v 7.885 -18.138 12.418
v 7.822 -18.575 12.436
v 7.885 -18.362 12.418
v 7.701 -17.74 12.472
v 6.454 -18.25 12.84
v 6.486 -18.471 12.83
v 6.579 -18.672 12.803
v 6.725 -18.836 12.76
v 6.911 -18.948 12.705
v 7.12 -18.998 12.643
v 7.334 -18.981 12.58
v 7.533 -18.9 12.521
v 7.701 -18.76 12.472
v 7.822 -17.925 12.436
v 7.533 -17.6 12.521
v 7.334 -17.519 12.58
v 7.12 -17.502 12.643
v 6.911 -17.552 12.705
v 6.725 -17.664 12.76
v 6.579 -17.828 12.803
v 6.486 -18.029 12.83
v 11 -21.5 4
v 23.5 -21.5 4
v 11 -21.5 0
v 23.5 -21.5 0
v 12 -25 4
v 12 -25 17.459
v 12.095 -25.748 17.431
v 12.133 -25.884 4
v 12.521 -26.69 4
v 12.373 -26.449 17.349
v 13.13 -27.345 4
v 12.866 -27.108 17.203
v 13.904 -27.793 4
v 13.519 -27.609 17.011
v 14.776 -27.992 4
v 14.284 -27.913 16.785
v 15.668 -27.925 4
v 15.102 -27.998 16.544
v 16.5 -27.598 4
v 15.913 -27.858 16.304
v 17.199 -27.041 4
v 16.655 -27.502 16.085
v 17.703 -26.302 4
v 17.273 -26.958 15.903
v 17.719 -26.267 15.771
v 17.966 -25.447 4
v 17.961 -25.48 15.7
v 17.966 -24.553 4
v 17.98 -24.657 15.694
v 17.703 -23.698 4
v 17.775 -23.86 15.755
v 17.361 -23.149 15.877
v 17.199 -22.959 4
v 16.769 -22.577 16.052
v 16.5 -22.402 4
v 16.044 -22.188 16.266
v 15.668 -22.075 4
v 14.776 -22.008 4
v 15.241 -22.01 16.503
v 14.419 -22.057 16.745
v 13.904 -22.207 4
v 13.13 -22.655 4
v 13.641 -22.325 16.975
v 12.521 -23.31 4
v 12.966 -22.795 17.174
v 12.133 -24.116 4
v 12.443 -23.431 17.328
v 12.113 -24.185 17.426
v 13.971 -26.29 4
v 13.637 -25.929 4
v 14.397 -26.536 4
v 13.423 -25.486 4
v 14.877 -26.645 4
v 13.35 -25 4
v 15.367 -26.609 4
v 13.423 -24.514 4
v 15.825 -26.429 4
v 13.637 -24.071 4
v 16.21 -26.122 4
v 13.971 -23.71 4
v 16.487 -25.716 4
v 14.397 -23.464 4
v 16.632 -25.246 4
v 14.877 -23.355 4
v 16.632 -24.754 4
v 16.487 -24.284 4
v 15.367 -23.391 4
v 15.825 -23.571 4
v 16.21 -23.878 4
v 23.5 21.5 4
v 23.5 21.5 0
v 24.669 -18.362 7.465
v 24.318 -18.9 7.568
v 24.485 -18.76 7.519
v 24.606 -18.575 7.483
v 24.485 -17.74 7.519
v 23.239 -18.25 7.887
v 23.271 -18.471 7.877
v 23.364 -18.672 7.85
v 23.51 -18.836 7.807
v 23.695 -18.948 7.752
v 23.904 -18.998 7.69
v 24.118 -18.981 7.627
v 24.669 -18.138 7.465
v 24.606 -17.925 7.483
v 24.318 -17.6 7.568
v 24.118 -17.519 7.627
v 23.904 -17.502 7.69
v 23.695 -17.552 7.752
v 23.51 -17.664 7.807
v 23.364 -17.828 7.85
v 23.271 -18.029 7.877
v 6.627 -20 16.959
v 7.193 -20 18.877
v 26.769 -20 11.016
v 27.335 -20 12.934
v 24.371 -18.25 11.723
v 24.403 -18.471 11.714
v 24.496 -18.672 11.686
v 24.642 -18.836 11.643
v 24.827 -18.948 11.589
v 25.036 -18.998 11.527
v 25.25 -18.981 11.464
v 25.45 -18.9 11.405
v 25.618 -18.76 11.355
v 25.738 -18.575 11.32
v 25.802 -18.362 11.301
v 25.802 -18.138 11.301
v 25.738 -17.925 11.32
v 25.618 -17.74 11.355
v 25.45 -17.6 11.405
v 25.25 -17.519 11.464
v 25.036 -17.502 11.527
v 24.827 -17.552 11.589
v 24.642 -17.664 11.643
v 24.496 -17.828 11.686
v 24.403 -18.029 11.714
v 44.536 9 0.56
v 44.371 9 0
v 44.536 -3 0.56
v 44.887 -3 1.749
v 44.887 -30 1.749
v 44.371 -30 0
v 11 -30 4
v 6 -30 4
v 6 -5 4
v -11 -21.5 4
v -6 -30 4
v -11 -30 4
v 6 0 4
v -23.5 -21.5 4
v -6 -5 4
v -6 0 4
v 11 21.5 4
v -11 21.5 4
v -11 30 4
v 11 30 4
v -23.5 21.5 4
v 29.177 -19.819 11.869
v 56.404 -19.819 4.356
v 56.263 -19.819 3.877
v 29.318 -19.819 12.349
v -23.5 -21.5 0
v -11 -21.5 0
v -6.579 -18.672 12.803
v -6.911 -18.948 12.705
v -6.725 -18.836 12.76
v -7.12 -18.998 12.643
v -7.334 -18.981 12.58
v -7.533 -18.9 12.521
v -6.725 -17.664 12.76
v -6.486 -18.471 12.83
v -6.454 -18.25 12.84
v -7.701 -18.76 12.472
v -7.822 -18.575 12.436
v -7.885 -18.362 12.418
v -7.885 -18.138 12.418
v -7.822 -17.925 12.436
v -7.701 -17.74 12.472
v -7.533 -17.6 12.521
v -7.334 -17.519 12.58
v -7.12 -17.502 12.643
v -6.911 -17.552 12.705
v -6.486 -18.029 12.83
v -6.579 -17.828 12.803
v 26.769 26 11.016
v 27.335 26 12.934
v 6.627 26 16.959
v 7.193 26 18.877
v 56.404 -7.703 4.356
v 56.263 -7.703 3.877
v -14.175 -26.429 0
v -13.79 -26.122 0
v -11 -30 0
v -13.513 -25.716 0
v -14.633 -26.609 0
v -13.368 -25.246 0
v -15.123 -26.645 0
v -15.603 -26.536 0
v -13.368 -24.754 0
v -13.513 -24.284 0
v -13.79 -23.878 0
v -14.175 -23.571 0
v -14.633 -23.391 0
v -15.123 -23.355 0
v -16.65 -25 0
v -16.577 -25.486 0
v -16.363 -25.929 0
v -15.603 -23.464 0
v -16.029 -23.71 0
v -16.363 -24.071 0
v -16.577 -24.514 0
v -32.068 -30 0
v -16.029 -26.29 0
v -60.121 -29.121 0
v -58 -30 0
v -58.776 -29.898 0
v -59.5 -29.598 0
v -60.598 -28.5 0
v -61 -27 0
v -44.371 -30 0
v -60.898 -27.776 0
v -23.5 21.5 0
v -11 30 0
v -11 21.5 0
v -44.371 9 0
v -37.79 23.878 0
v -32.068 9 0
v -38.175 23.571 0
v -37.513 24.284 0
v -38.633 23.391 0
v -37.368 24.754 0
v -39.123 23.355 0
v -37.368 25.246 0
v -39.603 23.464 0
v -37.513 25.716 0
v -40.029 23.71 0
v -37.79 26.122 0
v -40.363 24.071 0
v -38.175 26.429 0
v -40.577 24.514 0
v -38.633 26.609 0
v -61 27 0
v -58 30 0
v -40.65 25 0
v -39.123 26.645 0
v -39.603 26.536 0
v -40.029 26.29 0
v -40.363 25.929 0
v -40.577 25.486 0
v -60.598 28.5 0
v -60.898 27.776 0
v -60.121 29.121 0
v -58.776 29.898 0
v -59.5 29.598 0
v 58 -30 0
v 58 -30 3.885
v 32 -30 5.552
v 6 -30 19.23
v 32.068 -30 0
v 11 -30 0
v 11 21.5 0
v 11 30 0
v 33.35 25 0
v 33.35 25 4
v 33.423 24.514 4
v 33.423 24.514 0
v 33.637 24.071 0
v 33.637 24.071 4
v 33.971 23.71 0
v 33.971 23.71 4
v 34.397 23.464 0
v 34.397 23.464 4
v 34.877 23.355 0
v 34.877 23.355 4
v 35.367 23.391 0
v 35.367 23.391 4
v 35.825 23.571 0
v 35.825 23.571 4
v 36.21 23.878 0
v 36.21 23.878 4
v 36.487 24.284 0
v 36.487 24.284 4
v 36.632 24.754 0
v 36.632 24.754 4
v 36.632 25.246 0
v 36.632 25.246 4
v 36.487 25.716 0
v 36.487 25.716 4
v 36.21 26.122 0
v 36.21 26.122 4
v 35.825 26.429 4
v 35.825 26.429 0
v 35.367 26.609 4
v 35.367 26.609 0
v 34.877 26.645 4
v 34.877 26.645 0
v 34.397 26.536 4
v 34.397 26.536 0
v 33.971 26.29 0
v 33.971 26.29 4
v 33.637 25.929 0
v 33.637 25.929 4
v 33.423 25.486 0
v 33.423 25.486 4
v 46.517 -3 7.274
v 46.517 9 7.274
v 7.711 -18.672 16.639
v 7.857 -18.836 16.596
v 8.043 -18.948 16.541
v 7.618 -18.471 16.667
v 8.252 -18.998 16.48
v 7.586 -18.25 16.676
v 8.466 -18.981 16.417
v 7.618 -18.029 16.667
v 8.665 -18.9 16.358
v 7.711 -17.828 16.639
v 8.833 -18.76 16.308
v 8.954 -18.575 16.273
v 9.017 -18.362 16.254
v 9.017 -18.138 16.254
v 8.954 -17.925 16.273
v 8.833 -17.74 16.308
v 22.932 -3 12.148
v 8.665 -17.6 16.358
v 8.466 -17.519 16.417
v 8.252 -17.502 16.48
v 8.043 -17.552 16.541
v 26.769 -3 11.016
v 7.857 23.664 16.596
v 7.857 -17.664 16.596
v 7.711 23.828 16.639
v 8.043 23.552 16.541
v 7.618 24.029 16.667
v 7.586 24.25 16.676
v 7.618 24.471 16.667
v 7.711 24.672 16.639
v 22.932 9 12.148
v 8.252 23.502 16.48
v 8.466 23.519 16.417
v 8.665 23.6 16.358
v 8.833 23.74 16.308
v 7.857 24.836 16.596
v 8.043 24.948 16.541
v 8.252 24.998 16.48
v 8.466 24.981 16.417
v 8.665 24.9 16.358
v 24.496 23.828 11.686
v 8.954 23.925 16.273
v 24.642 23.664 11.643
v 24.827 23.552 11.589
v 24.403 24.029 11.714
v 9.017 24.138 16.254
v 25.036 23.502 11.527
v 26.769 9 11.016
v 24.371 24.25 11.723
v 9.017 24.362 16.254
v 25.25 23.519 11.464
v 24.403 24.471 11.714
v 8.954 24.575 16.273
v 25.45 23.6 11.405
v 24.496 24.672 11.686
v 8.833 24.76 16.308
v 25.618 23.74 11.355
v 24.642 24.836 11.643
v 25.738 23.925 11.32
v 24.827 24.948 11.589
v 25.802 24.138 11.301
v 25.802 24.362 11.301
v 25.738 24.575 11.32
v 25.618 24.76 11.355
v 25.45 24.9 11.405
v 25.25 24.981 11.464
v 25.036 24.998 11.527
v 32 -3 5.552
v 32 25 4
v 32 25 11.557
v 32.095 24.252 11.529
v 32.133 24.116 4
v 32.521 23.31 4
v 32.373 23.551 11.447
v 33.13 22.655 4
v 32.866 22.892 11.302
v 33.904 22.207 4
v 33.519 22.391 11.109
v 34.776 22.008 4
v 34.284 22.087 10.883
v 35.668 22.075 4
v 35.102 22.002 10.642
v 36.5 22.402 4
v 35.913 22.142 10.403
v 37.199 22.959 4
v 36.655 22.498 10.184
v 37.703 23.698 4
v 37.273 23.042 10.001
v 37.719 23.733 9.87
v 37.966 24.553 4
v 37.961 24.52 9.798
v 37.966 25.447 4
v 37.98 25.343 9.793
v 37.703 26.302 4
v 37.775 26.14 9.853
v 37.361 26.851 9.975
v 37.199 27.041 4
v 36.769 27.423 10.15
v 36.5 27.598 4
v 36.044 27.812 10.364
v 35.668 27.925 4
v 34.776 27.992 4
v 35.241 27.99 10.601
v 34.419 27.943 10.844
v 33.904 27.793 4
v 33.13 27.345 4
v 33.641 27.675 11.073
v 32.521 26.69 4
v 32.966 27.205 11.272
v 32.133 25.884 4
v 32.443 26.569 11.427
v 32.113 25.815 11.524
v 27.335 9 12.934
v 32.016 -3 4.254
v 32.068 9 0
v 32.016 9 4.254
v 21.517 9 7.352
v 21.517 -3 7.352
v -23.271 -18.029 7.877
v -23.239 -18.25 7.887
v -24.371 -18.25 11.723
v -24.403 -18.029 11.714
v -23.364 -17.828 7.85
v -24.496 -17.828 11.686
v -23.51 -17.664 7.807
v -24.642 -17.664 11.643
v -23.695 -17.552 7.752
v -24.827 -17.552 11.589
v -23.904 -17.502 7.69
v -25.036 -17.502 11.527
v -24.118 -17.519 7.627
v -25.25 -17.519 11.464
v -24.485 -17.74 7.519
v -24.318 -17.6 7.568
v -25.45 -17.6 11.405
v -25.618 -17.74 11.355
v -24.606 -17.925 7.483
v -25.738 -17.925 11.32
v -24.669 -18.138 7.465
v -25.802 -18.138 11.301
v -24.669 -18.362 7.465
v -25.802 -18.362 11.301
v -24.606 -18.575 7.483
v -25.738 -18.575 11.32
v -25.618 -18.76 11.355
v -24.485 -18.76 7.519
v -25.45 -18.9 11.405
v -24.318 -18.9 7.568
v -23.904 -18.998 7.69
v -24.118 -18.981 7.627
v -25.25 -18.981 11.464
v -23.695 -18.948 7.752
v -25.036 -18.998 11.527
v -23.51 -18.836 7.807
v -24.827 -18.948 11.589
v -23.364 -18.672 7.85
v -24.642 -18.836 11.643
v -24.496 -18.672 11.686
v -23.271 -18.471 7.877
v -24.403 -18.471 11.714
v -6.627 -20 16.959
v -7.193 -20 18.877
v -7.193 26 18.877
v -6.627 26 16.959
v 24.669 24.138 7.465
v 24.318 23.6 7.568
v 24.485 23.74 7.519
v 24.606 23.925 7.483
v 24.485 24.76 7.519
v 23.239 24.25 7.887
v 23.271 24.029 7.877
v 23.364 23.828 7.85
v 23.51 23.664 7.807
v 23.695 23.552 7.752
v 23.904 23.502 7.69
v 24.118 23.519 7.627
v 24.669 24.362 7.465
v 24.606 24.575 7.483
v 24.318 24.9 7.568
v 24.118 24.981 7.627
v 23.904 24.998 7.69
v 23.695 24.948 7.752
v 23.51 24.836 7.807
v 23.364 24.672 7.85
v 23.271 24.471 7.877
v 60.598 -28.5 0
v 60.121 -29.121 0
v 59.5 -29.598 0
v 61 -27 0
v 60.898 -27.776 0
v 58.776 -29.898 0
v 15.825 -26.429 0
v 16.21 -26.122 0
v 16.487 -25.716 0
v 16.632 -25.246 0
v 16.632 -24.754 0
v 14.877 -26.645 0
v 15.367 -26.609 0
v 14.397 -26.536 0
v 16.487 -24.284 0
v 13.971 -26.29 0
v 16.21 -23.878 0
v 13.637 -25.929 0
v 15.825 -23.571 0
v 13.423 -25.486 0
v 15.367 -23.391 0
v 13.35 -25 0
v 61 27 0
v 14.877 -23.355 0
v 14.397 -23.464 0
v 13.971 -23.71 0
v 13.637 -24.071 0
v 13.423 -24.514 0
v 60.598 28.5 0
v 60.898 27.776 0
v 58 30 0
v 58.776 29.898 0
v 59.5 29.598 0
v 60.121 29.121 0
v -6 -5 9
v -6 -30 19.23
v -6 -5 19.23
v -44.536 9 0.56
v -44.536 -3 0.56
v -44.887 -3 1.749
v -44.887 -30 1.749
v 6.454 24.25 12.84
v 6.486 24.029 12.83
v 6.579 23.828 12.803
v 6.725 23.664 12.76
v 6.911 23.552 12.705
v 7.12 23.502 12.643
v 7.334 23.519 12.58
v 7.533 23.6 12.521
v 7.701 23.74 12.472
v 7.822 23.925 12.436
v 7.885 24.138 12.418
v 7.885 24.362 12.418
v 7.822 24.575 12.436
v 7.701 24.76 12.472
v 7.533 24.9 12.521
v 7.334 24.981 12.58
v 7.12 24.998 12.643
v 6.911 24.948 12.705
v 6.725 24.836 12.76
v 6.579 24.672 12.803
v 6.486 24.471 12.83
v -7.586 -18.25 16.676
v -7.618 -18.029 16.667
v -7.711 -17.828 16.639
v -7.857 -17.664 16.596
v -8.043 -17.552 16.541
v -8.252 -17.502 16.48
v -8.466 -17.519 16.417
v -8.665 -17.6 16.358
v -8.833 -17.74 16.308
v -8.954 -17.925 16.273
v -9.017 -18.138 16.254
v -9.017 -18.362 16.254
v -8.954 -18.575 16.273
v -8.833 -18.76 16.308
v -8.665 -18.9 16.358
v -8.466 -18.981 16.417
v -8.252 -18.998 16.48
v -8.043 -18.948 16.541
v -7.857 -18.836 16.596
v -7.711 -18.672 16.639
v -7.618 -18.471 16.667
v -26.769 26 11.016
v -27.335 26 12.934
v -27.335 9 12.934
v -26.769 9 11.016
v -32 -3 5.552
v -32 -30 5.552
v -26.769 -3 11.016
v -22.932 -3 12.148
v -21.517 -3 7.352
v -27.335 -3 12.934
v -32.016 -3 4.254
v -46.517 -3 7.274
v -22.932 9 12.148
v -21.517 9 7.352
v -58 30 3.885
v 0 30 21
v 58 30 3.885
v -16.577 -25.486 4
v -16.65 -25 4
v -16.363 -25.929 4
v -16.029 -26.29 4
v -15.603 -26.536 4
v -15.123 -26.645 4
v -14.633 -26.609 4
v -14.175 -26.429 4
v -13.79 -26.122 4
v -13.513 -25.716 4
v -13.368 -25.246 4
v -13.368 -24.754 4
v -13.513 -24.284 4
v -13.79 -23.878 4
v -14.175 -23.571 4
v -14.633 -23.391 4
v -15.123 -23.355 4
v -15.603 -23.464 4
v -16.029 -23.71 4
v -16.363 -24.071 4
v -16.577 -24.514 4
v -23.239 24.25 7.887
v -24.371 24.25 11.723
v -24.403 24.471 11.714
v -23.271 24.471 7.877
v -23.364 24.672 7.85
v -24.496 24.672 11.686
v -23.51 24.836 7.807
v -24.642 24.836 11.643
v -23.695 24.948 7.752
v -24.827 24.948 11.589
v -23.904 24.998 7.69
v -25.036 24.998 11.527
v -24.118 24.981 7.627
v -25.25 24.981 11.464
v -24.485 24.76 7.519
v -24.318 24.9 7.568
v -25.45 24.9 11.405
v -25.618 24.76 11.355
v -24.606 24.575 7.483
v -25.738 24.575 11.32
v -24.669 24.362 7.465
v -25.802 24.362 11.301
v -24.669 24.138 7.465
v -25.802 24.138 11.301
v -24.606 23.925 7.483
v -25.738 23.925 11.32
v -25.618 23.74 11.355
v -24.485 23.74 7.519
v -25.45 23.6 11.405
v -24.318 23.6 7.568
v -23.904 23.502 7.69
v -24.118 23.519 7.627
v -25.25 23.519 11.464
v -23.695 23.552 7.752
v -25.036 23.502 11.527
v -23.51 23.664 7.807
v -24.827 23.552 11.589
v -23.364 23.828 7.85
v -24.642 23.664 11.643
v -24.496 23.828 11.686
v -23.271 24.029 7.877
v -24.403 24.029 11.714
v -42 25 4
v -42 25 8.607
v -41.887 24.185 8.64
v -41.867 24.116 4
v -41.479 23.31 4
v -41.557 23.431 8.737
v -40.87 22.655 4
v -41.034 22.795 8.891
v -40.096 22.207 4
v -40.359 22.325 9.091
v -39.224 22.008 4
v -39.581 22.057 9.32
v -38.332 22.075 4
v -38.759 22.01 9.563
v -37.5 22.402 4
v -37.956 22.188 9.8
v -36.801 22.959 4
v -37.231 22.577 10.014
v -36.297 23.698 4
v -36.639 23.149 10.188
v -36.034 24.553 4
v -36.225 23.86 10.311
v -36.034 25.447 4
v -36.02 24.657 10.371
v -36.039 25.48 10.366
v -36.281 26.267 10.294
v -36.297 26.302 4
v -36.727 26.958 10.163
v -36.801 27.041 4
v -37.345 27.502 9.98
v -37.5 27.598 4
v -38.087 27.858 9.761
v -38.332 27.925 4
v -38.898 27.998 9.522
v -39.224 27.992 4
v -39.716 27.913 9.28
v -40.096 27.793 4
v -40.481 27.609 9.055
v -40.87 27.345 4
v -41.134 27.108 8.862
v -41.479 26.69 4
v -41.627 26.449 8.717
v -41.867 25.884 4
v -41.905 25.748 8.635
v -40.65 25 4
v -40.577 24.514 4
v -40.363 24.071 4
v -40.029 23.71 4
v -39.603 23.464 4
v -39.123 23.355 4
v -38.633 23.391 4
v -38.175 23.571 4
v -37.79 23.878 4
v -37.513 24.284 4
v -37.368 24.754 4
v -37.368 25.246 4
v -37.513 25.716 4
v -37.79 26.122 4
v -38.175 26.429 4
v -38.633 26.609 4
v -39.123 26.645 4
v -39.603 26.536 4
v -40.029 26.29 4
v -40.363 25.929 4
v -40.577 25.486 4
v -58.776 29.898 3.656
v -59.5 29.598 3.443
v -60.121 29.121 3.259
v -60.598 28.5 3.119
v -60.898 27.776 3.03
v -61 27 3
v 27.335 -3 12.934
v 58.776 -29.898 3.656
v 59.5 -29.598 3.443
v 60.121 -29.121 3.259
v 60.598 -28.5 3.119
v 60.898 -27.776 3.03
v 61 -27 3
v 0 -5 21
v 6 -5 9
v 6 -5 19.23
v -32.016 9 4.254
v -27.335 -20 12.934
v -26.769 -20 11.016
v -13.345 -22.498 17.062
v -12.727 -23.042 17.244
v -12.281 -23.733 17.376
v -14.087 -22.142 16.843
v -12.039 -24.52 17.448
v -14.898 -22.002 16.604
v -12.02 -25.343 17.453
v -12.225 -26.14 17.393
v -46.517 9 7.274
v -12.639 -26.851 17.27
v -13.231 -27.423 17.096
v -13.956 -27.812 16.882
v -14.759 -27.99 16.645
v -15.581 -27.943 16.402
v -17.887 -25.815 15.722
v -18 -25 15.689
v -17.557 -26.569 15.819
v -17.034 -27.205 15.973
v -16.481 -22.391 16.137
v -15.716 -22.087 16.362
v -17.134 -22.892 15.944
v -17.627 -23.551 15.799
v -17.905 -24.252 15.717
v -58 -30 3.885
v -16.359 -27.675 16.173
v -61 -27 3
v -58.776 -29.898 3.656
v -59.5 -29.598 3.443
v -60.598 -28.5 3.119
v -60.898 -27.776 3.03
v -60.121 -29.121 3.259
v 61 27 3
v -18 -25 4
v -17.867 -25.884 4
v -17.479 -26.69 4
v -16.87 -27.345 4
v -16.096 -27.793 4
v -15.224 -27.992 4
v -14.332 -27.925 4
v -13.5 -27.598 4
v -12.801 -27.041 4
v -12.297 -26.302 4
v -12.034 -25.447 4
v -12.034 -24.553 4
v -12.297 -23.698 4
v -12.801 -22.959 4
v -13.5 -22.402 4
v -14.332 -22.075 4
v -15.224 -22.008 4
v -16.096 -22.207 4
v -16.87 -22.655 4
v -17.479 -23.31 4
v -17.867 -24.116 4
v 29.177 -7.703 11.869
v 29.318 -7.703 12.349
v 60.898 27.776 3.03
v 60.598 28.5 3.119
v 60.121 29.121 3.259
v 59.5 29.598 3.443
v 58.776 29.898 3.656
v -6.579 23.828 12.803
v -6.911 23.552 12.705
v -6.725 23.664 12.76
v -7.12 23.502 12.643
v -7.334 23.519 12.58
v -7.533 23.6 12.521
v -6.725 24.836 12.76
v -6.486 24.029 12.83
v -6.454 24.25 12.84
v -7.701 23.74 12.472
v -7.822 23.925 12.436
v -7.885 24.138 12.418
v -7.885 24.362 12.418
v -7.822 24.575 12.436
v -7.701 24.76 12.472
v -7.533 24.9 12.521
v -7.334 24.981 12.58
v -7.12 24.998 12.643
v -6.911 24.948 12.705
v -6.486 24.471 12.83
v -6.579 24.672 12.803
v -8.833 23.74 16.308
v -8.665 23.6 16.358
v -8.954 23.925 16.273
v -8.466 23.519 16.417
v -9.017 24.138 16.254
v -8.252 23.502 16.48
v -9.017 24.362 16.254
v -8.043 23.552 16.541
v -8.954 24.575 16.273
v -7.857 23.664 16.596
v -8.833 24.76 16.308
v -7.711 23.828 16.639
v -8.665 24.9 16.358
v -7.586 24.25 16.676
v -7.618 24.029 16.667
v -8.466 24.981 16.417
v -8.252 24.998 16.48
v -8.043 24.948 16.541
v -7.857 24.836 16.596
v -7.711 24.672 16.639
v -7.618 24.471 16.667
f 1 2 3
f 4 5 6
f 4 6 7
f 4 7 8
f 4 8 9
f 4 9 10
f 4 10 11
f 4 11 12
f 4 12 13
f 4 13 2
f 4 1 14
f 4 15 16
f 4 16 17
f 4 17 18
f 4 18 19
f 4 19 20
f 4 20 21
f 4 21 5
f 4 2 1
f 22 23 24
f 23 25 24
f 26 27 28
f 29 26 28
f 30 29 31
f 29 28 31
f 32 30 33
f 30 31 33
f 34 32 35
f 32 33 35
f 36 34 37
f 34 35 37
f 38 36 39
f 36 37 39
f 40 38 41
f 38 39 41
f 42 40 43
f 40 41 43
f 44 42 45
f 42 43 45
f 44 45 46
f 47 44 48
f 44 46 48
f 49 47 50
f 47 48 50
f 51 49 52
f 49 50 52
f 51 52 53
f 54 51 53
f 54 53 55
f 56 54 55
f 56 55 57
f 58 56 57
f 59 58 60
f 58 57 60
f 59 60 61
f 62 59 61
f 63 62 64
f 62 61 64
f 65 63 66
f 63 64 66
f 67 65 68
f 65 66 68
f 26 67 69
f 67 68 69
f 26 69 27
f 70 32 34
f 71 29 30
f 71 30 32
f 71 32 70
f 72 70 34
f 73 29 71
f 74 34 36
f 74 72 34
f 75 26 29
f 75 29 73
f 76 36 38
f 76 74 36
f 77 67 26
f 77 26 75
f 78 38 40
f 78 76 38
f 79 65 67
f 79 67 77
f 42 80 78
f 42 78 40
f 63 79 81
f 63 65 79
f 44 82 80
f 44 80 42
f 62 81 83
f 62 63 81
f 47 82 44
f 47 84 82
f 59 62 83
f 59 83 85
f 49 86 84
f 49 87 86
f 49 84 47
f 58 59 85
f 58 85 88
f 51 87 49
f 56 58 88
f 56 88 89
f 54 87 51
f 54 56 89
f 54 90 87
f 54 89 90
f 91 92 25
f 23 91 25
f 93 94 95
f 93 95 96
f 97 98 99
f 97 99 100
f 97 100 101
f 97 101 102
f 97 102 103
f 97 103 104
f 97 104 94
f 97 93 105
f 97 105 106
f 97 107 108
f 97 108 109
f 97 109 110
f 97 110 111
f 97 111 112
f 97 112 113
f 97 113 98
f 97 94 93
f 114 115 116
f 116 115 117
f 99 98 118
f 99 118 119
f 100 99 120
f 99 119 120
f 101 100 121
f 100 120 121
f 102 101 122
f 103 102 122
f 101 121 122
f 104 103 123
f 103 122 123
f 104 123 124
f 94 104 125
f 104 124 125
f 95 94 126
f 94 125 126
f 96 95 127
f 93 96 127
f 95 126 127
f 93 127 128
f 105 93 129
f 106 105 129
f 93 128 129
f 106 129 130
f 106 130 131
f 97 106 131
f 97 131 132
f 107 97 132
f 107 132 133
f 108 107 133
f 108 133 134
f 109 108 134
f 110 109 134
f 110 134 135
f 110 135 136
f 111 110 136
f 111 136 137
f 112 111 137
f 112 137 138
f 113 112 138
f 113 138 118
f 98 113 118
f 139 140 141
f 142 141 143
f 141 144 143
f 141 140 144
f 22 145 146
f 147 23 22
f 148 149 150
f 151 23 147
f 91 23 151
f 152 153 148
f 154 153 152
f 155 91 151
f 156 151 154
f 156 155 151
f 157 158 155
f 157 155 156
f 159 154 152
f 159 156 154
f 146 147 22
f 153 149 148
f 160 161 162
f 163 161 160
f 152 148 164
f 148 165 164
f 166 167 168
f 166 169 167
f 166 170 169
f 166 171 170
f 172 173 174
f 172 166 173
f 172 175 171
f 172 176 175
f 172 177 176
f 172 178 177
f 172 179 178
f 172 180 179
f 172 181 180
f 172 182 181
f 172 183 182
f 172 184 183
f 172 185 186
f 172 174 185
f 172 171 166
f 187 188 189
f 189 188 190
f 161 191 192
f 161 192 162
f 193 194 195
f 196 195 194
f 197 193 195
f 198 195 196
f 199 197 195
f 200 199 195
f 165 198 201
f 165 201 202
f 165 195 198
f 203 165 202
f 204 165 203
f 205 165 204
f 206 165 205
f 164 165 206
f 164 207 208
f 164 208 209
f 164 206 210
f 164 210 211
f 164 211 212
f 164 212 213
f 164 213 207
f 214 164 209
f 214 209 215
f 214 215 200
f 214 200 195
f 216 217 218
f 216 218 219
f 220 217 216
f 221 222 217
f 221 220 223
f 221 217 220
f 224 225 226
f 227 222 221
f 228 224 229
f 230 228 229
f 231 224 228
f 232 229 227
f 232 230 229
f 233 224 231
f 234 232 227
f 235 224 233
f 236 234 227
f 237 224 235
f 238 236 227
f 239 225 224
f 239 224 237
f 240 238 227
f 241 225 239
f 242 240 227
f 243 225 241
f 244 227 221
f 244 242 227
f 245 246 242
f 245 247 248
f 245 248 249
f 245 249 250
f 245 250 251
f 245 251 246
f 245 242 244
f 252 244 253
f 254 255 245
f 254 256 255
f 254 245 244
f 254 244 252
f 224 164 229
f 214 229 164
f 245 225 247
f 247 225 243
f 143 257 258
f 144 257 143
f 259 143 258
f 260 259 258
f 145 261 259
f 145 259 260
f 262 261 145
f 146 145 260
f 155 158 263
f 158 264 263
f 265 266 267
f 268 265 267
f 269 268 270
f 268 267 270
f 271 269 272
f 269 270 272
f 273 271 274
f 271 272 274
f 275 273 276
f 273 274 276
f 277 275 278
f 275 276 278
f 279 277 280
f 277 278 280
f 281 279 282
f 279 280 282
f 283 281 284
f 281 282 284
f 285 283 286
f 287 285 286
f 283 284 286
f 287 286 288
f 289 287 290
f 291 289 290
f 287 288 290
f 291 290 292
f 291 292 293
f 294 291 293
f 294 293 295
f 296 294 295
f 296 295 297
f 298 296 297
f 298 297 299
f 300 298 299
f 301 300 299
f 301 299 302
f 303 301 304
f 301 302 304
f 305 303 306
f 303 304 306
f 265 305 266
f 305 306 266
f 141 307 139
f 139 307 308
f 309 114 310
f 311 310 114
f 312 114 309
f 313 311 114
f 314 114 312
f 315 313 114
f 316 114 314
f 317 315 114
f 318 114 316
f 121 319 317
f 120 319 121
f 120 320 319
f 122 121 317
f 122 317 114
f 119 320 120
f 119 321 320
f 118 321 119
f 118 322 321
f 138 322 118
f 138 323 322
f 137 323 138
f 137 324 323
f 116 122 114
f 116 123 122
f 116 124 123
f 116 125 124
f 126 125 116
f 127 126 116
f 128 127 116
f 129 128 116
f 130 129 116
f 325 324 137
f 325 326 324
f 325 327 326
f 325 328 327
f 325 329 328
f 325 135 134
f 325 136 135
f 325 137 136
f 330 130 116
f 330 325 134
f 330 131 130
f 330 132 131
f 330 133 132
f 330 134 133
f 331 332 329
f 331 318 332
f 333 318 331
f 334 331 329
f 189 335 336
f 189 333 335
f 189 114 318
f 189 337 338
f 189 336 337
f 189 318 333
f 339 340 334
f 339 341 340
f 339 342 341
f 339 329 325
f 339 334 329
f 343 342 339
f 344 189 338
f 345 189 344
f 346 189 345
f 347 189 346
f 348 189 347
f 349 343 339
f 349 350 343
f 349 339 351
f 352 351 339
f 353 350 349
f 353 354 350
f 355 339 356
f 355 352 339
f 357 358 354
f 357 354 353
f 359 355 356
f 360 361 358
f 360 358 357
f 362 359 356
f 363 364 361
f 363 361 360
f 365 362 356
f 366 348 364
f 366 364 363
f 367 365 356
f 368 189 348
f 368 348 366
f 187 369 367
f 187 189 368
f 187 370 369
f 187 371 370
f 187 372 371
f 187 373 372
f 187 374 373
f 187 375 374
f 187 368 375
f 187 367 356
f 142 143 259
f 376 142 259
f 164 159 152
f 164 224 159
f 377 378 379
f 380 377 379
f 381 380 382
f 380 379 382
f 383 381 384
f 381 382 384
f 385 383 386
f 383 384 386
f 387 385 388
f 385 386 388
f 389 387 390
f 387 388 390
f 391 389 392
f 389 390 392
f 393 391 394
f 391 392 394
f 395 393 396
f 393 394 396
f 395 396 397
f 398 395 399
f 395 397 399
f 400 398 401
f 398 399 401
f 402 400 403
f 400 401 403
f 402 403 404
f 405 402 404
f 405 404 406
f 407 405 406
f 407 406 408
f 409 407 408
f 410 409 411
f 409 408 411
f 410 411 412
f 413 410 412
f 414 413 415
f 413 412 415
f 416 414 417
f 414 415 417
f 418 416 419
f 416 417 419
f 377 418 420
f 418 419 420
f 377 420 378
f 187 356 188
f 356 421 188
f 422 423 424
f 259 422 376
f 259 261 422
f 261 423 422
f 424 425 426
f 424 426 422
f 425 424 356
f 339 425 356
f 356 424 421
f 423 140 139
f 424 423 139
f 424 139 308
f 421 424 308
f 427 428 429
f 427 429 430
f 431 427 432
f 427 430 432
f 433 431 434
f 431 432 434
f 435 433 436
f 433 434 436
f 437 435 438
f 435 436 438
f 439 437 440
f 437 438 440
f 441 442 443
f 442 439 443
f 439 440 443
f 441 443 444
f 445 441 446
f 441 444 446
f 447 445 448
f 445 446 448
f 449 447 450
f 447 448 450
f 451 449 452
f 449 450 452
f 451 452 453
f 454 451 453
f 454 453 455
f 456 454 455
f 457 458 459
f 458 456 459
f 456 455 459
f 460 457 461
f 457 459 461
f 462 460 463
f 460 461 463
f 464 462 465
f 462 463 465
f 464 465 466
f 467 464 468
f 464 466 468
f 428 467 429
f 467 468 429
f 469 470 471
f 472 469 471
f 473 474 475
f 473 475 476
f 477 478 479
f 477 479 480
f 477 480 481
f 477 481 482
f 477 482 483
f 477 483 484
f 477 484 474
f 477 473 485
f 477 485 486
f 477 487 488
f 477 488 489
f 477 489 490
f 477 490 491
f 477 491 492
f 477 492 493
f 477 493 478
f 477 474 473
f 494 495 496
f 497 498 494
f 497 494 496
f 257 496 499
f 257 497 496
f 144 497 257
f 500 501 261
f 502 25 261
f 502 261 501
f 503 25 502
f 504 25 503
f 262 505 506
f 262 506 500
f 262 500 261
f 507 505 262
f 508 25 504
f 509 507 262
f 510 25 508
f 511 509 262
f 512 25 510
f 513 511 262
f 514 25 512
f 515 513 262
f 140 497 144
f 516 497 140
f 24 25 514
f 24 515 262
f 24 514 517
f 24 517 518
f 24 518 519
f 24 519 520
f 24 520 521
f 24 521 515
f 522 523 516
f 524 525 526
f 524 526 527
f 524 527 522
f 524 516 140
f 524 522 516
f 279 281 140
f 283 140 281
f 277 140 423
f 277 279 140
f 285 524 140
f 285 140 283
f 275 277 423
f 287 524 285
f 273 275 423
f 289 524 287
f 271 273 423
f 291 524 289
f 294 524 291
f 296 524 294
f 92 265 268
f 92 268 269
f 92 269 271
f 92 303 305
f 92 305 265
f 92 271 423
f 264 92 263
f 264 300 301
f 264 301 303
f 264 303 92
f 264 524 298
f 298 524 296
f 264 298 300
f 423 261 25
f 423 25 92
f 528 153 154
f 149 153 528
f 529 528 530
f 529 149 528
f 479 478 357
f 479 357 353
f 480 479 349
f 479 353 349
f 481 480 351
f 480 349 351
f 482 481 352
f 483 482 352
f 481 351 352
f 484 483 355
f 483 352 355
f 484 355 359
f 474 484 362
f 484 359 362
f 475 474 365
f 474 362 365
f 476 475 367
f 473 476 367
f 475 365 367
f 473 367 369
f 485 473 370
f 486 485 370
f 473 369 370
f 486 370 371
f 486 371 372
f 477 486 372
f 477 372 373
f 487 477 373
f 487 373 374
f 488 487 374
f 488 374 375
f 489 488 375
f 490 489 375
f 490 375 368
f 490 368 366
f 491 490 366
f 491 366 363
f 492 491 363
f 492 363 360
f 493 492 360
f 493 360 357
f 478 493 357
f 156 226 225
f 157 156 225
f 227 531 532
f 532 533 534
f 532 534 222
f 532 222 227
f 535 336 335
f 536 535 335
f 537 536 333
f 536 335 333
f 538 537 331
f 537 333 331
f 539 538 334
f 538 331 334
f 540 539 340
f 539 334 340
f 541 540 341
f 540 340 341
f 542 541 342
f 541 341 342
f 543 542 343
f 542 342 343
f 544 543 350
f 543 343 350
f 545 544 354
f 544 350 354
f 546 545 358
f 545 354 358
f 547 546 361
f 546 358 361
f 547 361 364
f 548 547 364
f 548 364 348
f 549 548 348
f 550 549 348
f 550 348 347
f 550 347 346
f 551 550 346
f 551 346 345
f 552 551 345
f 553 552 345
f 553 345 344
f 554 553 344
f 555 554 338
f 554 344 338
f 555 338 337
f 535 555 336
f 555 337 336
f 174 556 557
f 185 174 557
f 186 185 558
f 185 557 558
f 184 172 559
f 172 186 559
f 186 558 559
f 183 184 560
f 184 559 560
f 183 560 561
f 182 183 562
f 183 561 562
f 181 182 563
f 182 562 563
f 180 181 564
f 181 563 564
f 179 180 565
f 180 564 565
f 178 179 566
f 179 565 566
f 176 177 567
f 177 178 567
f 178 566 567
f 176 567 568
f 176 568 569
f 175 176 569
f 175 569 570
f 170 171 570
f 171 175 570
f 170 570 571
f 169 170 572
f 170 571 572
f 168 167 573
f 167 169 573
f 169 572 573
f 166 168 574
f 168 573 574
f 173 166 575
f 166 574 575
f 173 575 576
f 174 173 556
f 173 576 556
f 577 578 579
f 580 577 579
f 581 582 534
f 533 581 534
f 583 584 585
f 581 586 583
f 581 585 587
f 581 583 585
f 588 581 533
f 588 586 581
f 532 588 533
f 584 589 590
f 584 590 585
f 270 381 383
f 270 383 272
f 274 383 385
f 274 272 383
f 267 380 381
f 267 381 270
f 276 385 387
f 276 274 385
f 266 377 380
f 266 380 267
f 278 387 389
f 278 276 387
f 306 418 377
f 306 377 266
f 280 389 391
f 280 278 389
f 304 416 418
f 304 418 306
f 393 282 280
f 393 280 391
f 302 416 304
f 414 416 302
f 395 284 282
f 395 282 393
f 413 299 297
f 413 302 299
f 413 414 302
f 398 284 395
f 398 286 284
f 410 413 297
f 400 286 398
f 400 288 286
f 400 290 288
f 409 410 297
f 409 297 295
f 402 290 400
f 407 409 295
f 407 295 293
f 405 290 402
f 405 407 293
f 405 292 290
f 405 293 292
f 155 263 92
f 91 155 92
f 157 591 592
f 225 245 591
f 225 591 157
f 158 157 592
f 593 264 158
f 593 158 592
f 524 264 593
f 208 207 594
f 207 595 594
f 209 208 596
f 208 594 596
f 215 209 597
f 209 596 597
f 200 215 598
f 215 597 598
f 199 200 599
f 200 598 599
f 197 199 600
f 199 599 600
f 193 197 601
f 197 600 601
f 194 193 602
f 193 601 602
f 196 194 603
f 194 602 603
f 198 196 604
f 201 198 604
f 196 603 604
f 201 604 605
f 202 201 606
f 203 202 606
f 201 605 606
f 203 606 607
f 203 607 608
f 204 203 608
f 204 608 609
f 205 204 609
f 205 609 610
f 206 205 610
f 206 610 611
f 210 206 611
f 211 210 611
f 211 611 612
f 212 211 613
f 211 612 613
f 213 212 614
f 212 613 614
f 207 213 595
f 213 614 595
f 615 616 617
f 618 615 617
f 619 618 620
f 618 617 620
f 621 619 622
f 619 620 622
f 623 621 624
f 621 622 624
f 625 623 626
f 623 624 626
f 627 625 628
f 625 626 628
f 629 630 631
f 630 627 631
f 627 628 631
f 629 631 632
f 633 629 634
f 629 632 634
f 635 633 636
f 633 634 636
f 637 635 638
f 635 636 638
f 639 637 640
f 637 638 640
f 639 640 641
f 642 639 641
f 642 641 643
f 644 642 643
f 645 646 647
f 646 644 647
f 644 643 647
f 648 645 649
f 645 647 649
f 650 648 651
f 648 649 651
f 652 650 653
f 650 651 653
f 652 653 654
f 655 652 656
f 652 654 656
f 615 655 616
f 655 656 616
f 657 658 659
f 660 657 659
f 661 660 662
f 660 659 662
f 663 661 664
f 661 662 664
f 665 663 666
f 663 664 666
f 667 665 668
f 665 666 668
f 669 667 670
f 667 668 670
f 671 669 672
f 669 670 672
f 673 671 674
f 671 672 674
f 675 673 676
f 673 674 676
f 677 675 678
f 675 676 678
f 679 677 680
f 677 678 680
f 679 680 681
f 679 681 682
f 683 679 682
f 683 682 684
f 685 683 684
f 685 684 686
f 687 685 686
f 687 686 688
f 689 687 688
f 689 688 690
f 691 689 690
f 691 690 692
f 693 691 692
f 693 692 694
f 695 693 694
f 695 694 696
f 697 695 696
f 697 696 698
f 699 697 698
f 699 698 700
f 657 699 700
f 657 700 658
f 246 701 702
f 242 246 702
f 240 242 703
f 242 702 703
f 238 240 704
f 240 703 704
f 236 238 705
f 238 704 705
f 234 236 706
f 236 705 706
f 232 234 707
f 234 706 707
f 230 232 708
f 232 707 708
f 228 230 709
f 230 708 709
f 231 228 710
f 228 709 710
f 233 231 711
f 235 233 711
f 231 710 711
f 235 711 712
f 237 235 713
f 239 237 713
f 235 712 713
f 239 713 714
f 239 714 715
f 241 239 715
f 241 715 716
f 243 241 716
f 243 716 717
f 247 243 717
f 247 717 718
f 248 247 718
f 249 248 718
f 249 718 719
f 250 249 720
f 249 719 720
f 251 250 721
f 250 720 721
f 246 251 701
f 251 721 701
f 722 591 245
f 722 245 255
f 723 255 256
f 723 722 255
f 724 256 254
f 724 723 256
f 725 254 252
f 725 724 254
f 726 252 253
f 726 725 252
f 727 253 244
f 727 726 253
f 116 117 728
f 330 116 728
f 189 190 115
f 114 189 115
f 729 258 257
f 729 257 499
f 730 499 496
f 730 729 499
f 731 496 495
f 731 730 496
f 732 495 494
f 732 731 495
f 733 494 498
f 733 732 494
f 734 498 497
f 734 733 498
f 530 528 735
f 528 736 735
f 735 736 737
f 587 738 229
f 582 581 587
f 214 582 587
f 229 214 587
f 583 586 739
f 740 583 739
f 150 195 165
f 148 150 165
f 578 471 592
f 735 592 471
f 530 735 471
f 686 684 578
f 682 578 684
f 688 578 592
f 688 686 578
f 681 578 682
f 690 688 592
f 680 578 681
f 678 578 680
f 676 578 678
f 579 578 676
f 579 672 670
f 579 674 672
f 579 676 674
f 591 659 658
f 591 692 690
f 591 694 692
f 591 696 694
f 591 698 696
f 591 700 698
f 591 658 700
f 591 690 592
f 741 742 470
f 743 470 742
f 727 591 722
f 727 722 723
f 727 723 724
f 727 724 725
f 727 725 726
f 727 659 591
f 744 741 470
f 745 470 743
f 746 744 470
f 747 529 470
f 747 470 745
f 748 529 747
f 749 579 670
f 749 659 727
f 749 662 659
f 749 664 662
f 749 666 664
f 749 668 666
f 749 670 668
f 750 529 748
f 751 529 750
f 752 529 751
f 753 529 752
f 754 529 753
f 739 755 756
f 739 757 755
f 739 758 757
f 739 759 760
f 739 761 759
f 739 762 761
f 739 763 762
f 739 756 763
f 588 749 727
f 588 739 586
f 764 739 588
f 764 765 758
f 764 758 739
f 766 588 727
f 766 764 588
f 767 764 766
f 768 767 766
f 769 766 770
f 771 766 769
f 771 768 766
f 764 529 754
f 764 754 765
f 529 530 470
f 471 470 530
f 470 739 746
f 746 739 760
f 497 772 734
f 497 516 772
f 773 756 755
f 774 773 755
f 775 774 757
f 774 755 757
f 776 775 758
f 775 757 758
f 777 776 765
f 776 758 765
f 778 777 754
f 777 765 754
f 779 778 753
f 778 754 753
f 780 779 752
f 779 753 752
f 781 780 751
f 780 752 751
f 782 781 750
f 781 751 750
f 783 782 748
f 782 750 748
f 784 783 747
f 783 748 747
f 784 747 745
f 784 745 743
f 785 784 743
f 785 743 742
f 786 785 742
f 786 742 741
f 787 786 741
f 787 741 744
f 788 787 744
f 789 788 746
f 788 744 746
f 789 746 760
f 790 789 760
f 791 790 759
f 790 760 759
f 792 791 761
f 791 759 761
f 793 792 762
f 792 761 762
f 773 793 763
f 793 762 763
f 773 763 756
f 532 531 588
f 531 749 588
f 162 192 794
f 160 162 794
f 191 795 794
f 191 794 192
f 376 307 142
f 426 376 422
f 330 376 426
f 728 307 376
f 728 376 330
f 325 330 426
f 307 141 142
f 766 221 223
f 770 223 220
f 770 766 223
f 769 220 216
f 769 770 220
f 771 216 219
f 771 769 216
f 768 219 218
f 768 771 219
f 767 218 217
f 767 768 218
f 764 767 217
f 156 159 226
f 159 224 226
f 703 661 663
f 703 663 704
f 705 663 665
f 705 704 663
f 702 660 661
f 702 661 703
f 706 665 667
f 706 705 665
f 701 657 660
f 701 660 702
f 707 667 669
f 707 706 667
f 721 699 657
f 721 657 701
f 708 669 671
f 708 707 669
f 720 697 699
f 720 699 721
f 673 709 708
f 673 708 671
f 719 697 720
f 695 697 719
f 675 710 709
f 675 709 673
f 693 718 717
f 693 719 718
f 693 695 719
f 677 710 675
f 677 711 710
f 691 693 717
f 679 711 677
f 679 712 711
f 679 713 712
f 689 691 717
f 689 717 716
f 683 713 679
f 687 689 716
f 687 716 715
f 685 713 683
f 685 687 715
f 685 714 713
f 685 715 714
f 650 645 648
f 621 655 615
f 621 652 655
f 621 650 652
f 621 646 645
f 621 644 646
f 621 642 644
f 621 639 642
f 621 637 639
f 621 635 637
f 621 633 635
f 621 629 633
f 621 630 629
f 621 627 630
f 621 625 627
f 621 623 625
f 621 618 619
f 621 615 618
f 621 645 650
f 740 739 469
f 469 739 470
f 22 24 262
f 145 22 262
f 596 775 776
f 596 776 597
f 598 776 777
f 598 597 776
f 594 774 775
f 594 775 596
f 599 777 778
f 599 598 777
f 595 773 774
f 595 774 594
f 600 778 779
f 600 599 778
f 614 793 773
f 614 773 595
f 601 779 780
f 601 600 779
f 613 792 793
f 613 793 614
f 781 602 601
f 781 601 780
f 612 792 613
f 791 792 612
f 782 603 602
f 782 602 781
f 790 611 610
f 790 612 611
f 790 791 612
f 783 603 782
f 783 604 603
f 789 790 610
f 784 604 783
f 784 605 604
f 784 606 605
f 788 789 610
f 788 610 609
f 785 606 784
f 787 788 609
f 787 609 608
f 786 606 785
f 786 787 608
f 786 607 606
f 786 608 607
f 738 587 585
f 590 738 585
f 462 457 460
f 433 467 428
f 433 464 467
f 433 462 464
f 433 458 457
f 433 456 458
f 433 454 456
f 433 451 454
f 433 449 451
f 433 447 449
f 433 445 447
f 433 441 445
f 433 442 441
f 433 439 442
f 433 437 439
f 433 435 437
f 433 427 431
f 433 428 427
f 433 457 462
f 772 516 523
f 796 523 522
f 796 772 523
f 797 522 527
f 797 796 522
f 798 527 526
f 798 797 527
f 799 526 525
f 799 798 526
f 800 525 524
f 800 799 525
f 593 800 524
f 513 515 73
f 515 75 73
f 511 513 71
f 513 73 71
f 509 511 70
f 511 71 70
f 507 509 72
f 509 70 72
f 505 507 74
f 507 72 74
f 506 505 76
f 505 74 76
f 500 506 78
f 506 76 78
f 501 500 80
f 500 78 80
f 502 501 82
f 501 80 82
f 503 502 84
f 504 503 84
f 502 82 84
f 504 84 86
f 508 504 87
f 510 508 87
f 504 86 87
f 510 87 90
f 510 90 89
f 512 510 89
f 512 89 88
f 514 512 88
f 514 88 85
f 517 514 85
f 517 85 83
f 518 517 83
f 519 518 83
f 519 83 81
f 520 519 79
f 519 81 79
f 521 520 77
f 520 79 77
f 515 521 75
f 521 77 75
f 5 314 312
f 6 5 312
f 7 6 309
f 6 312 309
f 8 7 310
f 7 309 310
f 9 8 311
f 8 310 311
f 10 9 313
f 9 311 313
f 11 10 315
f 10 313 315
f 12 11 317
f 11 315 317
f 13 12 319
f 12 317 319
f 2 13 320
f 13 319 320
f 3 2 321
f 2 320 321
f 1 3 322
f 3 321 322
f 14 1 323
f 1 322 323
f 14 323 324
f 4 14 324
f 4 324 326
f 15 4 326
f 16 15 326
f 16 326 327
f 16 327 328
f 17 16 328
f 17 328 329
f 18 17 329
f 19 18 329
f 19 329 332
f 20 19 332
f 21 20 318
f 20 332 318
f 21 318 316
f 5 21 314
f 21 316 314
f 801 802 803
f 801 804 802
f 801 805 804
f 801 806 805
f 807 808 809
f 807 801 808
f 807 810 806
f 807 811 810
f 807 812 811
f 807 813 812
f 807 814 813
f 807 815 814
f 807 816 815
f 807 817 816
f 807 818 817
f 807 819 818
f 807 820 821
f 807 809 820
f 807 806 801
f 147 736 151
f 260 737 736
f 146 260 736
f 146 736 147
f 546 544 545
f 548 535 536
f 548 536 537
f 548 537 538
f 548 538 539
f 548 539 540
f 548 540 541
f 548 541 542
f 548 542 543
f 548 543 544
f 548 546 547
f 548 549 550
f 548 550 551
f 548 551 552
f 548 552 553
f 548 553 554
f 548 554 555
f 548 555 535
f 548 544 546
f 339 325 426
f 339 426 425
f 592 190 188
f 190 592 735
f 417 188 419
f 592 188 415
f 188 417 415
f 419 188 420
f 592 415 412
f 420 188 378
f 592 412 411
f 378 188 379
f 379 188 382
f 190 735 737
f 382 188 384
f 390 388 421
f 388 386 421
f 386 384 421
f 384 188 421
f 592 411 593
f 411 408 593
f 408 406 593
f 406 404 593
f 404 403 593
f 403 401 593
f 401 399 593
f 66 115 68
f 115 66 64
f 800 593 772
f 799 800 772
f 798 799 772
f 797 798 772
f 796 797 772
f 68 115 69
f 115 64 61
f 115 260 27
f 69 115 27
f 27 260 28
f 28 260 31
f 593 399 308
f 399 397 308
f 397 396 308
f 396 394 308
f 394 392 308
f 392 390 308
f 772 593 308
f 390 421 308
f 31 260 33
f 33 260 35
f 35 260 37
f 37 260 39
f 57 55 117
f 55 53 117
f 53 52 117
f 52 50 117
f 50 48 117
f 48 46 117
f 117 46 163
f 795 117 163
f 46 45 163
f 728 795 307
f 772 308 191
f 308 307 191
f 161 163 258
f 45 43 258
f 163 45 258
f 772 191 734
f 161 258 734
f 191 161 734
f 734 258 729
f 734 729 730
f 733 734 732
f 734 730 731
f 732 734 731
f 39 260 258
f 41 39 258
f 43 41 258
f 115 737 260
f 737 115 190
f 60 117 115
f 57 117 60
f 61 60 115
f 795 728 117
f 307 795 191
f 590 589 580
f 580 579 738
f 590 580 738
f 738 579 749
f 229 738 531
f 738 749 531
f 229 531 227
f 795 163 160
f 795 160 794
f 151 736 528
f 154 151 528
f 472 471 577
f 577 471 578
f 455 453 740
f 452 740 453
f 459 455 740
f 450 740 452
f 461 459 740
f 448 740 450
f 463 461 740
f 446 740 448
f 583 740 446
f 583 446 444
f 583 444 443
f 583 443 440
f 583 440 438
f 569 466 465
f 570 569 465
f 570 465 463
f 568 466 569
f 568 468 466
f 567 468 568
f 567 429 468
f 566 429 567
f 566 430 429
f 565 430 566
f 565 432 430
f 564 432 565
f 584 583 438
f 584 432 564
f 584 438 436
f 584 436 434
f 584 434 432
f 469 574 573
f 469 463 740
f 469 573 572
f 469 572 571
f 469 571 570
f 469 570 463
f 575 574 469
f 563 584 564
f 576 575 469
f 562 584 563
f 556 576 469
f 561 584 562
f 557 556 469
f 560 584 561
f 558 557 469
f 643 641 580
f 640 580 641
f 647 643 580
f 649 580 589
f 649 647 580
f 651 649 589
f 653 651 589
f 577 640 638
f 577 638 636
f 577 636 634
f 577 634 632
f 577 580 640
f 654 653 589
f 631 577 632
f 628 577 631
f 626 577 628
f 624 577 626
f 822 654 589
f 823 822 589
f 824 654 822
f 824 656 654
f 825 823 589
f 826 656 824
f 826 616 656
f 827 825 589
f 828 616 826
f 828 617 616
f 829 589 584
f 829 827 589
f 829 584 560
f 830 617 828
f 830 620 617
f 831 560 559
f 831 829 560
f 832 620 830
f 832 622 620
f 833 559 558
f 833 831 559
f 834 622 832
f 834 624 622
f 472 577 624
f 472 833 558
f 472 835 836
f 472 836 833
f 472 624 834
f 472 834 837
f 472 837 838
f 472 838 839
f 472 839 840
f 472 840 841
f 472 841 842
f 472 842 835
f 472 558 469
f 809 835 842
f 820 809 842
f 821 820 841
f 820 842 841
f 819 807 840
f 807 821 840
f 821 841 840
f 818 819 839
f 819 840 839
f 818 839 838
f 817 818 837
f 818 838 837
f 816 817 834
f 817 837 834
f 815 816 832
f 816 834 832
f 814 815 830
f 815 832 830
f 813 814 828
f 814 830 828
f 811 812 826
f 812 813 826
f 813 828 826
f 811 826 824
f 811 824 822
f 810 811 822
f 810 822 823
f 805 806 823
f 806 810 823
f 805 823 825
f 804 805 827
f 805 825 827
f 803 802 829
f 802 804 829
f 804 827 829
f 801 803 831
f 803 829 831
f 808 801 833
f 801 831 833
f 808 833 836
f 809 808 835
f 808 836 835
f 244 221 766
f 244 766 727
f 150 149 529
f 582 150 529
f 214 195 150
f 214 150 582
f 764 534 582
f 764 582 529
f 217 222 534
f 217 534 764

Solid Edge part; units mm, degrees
sketch "Sketch1" plane through (0, 0, 0) normal (0, 0, 1) x (1, 0, 0)
  line L0 (-61, 30) -> (61, 30)
  line L1 (61, 30) -> (61, -30)
  line L2 (61, -30) -> (-61, -30)
  line L3 (-61, -30) -> (-61, 30)
  dimension "D1" = 122
  dimension "D2" = 60
extrude "Protrusion1" add sketch "Sketch1" along normal blind 26
fillet "Redondeo_1" radius 3 4 edges at (61, 30, 13) (61, -30, 13) (-61, -30, 13) (-61, 30, 13)
sketch "Sketch2" plane through (0, 0, 26) normal (0, 0, 1) x (-1, 0, 0)
  circle A0 centre (15, 25) radius 1.65
  circle A1 centre (39, -25) radius 1.65
  circle A2 centre (-35, -25) radius 1.65
  circle A3 centre (-15, 25) radius 1.65
  dimension "D1" = 30
  dimension "D2" = 15
  dimension "D3" = 39
  dimension "D4" = 35
  dimension "D5" = 5
  dimension "D6" = 5
extrude "Cutout1" cut sketch "Sketch2" against normal up to next
sketch "Sketch3" plane through (0, 0, 26) normal (0, 0, 1) x (-1, 0, 0)
  circle A0 centre (-15, 25) radius 3
  circle A1 centre (15, 25) radius 3
  circle A2 centre (-35, -25) radius 3
  circle A3 centre (39, -25) radius 3
extrude "VaciadoExtruido_30" cut sketch "Sketch3" against normal blind 22
sketch "Sketch4" plane through (0, -30, 13) normal (0, -1, 0) x (-1, 0, 0)
  line L0 (0, -8) -> (-61, 10)
  line L1 (0, -8) -> (61, 10)
  dimension "D1" = 5
  dimension "D2" = 3
  dimension "D3" = 3
extrude "Cutout2" cut sketch "Sketch4" against normal up to next material side at (30.5142, -30, 12.048)
sketch "Sketch5" plane through (31.3143, 0, 11.7597) normal (0.283, 0, 0.9591) x (-0.9591, 0, 0.283)
  line L0 (4.1492, 20) -> (4.1492, -26)
  line L1 (4.1492, -26) -> (25.1492, -26)
  line L2 (25.1492, -26) -> (25.1492, 20)
  line L3 (25.1492, 20) -> (4.1492, 20)
  dimension "D1" = 46
  dimension "D2" = 21
  dimension "D3" = 26
  dimension "D4" = 7.5
extrude "Cutout3" cut sketch "Sketch5" against normal blind 2
sketch "Sketch6" plane through (31.3143, 0, 11.7597) normal (0.283, 0, 0.9591) x (-0.9591, 0, 0.283)
  line L0 (-15.8508, 3) -> (-15.8508, -9)
  line L1 (-15.8508, -9) -> (8.1492, -9)
  line L2 (8.1492, 3) -> (8.1492, -9)
  line L3 (-15.8508, 3) -> (8.1492, 3)
  dimension "D1" = 12
  dimension "D2" = 24
  dimension "D3" = 4
  dimension "D4" = 23
extrude "VaciadoExtruido_32" cut sketch "Sketch6" against normal blind 7
sketch "Sketch7" plane through (16.0737, 3, 14.1717) normal (0.283, 0, 0.9591) x (-0.9591, 0, 0.283)
  circle A0 centre (-9.4009, 21.25) radius 0.75
  circle A1 centre (8.0991, 21.25) radius 0.75
  circle A2 centre (8.0991, -21.25) radius 0.75
  circle A3 centre (-9.4009, -21.25) radius 0.75
  dimension "D1" = 17.5
  dimension "D2" = 42.5
  dimension "D3" = 1.75
  dimension "D4" = 1.75
extrude "VaciadoExtruido_33" cut sketch "Sketch7" against normal blind 4
sketch "Sketch8" plane through (32, -30, 9.6148) normal (0, -1, 0) x (-1, 0, 0)
  line L0 (-12.3707, 9.6148) -> (-0.0681, 9.6148)
  line L1 (-0.0681, 9.6148) -> (0, 4.0632)
  line L2 (-12.8868, 7.8658) -> (0, 4.0632)
  line L3 (-12.3707, 9.6148) -> (-12.8868, 7.8658)
extrude "Cutout4" cut sketch "Sketch8" against normal up to surface (39 mm away)
mirror "Mirror1" about plane through (0, 0, 0) normal (1, 0, 0) of "Cutout3", "VaciadoExtruido_32", "VaciadoExtruido_33", "Cutout4"
sketch "Sketch9" plane through (31.3143, 0, 11.7597) normal (0.283, 0, 0.9591) x (-0.9591, 0, 0.283)
  line L0 (-26.1597, 19.8186) -> (2.081, 19.8186)
  line L1 (2.081, 19.8186) -> (2.081, 7.703)
  line L2 (2.081, 7.703) -> (-26.1597, 7.703)
  line L3 (-26.1597, 7.703) -> (-26.1597, 19.8186)
extrude "VaciadoExtruido_38" cut sketch "Sketch9" against normal blind 0.5
sketch "Sketch10" plane through (0, 0, 0) normal (0, 0, -1) x (1, 0, 0)
  line L0 (-23.5, -21.5) -> (-23.5, 21.5)
  line L1 (23.5, 21.5) -> (-23.5, 21.5)
  line L2 (23.5, -21.5) -> (23.5, 21.5)
  line L3 (-23.5, -21.5) -> (23.5, -21.5)
  dimension "D1" = 47
  dimension "D2" = 43
extrude "VaciadoExtruido_39" cut sketch "Sketch10" against normal blind 4
sketch "Sketch11" plane through (0, 0, 0) normal (0, 0, -1) x (1, 0, 0)
  line L0 (-11, 30) -> (-11, -30)
  line L1 (-11, -30) -> (11, -30)
  line L2 (11, -30) -> (11, 30)
  line L3 (11, 30) -> (-11, 30)
  dimension "D1" = 22
extrude "Cutout9" cut sketch "Sketch11" against normal up to surface (4 mm away)
sketch "Sketch12" plane through (0, -30, 9) normal (0, -1, 0) x (1, 0, 0)
  line L0 (-6, 14) -> (6, 14)
  line L1 (6, 14) -> (6, -9)
  line L2 (6, -9) -> (-6, -9)
  line L3 (-6, -9) -> (-6, 14)
  dimension "D1" = 12
  dimension "D2" = 23
extrude "VaciadoExtruido_41" cut sketch "Sketch12" against normal blind 25
chamfer "Chaflán_2" distance 5 angle 45 1 edges at (0, -5, 4)
properties material "Aluminum, 2024-T4"
